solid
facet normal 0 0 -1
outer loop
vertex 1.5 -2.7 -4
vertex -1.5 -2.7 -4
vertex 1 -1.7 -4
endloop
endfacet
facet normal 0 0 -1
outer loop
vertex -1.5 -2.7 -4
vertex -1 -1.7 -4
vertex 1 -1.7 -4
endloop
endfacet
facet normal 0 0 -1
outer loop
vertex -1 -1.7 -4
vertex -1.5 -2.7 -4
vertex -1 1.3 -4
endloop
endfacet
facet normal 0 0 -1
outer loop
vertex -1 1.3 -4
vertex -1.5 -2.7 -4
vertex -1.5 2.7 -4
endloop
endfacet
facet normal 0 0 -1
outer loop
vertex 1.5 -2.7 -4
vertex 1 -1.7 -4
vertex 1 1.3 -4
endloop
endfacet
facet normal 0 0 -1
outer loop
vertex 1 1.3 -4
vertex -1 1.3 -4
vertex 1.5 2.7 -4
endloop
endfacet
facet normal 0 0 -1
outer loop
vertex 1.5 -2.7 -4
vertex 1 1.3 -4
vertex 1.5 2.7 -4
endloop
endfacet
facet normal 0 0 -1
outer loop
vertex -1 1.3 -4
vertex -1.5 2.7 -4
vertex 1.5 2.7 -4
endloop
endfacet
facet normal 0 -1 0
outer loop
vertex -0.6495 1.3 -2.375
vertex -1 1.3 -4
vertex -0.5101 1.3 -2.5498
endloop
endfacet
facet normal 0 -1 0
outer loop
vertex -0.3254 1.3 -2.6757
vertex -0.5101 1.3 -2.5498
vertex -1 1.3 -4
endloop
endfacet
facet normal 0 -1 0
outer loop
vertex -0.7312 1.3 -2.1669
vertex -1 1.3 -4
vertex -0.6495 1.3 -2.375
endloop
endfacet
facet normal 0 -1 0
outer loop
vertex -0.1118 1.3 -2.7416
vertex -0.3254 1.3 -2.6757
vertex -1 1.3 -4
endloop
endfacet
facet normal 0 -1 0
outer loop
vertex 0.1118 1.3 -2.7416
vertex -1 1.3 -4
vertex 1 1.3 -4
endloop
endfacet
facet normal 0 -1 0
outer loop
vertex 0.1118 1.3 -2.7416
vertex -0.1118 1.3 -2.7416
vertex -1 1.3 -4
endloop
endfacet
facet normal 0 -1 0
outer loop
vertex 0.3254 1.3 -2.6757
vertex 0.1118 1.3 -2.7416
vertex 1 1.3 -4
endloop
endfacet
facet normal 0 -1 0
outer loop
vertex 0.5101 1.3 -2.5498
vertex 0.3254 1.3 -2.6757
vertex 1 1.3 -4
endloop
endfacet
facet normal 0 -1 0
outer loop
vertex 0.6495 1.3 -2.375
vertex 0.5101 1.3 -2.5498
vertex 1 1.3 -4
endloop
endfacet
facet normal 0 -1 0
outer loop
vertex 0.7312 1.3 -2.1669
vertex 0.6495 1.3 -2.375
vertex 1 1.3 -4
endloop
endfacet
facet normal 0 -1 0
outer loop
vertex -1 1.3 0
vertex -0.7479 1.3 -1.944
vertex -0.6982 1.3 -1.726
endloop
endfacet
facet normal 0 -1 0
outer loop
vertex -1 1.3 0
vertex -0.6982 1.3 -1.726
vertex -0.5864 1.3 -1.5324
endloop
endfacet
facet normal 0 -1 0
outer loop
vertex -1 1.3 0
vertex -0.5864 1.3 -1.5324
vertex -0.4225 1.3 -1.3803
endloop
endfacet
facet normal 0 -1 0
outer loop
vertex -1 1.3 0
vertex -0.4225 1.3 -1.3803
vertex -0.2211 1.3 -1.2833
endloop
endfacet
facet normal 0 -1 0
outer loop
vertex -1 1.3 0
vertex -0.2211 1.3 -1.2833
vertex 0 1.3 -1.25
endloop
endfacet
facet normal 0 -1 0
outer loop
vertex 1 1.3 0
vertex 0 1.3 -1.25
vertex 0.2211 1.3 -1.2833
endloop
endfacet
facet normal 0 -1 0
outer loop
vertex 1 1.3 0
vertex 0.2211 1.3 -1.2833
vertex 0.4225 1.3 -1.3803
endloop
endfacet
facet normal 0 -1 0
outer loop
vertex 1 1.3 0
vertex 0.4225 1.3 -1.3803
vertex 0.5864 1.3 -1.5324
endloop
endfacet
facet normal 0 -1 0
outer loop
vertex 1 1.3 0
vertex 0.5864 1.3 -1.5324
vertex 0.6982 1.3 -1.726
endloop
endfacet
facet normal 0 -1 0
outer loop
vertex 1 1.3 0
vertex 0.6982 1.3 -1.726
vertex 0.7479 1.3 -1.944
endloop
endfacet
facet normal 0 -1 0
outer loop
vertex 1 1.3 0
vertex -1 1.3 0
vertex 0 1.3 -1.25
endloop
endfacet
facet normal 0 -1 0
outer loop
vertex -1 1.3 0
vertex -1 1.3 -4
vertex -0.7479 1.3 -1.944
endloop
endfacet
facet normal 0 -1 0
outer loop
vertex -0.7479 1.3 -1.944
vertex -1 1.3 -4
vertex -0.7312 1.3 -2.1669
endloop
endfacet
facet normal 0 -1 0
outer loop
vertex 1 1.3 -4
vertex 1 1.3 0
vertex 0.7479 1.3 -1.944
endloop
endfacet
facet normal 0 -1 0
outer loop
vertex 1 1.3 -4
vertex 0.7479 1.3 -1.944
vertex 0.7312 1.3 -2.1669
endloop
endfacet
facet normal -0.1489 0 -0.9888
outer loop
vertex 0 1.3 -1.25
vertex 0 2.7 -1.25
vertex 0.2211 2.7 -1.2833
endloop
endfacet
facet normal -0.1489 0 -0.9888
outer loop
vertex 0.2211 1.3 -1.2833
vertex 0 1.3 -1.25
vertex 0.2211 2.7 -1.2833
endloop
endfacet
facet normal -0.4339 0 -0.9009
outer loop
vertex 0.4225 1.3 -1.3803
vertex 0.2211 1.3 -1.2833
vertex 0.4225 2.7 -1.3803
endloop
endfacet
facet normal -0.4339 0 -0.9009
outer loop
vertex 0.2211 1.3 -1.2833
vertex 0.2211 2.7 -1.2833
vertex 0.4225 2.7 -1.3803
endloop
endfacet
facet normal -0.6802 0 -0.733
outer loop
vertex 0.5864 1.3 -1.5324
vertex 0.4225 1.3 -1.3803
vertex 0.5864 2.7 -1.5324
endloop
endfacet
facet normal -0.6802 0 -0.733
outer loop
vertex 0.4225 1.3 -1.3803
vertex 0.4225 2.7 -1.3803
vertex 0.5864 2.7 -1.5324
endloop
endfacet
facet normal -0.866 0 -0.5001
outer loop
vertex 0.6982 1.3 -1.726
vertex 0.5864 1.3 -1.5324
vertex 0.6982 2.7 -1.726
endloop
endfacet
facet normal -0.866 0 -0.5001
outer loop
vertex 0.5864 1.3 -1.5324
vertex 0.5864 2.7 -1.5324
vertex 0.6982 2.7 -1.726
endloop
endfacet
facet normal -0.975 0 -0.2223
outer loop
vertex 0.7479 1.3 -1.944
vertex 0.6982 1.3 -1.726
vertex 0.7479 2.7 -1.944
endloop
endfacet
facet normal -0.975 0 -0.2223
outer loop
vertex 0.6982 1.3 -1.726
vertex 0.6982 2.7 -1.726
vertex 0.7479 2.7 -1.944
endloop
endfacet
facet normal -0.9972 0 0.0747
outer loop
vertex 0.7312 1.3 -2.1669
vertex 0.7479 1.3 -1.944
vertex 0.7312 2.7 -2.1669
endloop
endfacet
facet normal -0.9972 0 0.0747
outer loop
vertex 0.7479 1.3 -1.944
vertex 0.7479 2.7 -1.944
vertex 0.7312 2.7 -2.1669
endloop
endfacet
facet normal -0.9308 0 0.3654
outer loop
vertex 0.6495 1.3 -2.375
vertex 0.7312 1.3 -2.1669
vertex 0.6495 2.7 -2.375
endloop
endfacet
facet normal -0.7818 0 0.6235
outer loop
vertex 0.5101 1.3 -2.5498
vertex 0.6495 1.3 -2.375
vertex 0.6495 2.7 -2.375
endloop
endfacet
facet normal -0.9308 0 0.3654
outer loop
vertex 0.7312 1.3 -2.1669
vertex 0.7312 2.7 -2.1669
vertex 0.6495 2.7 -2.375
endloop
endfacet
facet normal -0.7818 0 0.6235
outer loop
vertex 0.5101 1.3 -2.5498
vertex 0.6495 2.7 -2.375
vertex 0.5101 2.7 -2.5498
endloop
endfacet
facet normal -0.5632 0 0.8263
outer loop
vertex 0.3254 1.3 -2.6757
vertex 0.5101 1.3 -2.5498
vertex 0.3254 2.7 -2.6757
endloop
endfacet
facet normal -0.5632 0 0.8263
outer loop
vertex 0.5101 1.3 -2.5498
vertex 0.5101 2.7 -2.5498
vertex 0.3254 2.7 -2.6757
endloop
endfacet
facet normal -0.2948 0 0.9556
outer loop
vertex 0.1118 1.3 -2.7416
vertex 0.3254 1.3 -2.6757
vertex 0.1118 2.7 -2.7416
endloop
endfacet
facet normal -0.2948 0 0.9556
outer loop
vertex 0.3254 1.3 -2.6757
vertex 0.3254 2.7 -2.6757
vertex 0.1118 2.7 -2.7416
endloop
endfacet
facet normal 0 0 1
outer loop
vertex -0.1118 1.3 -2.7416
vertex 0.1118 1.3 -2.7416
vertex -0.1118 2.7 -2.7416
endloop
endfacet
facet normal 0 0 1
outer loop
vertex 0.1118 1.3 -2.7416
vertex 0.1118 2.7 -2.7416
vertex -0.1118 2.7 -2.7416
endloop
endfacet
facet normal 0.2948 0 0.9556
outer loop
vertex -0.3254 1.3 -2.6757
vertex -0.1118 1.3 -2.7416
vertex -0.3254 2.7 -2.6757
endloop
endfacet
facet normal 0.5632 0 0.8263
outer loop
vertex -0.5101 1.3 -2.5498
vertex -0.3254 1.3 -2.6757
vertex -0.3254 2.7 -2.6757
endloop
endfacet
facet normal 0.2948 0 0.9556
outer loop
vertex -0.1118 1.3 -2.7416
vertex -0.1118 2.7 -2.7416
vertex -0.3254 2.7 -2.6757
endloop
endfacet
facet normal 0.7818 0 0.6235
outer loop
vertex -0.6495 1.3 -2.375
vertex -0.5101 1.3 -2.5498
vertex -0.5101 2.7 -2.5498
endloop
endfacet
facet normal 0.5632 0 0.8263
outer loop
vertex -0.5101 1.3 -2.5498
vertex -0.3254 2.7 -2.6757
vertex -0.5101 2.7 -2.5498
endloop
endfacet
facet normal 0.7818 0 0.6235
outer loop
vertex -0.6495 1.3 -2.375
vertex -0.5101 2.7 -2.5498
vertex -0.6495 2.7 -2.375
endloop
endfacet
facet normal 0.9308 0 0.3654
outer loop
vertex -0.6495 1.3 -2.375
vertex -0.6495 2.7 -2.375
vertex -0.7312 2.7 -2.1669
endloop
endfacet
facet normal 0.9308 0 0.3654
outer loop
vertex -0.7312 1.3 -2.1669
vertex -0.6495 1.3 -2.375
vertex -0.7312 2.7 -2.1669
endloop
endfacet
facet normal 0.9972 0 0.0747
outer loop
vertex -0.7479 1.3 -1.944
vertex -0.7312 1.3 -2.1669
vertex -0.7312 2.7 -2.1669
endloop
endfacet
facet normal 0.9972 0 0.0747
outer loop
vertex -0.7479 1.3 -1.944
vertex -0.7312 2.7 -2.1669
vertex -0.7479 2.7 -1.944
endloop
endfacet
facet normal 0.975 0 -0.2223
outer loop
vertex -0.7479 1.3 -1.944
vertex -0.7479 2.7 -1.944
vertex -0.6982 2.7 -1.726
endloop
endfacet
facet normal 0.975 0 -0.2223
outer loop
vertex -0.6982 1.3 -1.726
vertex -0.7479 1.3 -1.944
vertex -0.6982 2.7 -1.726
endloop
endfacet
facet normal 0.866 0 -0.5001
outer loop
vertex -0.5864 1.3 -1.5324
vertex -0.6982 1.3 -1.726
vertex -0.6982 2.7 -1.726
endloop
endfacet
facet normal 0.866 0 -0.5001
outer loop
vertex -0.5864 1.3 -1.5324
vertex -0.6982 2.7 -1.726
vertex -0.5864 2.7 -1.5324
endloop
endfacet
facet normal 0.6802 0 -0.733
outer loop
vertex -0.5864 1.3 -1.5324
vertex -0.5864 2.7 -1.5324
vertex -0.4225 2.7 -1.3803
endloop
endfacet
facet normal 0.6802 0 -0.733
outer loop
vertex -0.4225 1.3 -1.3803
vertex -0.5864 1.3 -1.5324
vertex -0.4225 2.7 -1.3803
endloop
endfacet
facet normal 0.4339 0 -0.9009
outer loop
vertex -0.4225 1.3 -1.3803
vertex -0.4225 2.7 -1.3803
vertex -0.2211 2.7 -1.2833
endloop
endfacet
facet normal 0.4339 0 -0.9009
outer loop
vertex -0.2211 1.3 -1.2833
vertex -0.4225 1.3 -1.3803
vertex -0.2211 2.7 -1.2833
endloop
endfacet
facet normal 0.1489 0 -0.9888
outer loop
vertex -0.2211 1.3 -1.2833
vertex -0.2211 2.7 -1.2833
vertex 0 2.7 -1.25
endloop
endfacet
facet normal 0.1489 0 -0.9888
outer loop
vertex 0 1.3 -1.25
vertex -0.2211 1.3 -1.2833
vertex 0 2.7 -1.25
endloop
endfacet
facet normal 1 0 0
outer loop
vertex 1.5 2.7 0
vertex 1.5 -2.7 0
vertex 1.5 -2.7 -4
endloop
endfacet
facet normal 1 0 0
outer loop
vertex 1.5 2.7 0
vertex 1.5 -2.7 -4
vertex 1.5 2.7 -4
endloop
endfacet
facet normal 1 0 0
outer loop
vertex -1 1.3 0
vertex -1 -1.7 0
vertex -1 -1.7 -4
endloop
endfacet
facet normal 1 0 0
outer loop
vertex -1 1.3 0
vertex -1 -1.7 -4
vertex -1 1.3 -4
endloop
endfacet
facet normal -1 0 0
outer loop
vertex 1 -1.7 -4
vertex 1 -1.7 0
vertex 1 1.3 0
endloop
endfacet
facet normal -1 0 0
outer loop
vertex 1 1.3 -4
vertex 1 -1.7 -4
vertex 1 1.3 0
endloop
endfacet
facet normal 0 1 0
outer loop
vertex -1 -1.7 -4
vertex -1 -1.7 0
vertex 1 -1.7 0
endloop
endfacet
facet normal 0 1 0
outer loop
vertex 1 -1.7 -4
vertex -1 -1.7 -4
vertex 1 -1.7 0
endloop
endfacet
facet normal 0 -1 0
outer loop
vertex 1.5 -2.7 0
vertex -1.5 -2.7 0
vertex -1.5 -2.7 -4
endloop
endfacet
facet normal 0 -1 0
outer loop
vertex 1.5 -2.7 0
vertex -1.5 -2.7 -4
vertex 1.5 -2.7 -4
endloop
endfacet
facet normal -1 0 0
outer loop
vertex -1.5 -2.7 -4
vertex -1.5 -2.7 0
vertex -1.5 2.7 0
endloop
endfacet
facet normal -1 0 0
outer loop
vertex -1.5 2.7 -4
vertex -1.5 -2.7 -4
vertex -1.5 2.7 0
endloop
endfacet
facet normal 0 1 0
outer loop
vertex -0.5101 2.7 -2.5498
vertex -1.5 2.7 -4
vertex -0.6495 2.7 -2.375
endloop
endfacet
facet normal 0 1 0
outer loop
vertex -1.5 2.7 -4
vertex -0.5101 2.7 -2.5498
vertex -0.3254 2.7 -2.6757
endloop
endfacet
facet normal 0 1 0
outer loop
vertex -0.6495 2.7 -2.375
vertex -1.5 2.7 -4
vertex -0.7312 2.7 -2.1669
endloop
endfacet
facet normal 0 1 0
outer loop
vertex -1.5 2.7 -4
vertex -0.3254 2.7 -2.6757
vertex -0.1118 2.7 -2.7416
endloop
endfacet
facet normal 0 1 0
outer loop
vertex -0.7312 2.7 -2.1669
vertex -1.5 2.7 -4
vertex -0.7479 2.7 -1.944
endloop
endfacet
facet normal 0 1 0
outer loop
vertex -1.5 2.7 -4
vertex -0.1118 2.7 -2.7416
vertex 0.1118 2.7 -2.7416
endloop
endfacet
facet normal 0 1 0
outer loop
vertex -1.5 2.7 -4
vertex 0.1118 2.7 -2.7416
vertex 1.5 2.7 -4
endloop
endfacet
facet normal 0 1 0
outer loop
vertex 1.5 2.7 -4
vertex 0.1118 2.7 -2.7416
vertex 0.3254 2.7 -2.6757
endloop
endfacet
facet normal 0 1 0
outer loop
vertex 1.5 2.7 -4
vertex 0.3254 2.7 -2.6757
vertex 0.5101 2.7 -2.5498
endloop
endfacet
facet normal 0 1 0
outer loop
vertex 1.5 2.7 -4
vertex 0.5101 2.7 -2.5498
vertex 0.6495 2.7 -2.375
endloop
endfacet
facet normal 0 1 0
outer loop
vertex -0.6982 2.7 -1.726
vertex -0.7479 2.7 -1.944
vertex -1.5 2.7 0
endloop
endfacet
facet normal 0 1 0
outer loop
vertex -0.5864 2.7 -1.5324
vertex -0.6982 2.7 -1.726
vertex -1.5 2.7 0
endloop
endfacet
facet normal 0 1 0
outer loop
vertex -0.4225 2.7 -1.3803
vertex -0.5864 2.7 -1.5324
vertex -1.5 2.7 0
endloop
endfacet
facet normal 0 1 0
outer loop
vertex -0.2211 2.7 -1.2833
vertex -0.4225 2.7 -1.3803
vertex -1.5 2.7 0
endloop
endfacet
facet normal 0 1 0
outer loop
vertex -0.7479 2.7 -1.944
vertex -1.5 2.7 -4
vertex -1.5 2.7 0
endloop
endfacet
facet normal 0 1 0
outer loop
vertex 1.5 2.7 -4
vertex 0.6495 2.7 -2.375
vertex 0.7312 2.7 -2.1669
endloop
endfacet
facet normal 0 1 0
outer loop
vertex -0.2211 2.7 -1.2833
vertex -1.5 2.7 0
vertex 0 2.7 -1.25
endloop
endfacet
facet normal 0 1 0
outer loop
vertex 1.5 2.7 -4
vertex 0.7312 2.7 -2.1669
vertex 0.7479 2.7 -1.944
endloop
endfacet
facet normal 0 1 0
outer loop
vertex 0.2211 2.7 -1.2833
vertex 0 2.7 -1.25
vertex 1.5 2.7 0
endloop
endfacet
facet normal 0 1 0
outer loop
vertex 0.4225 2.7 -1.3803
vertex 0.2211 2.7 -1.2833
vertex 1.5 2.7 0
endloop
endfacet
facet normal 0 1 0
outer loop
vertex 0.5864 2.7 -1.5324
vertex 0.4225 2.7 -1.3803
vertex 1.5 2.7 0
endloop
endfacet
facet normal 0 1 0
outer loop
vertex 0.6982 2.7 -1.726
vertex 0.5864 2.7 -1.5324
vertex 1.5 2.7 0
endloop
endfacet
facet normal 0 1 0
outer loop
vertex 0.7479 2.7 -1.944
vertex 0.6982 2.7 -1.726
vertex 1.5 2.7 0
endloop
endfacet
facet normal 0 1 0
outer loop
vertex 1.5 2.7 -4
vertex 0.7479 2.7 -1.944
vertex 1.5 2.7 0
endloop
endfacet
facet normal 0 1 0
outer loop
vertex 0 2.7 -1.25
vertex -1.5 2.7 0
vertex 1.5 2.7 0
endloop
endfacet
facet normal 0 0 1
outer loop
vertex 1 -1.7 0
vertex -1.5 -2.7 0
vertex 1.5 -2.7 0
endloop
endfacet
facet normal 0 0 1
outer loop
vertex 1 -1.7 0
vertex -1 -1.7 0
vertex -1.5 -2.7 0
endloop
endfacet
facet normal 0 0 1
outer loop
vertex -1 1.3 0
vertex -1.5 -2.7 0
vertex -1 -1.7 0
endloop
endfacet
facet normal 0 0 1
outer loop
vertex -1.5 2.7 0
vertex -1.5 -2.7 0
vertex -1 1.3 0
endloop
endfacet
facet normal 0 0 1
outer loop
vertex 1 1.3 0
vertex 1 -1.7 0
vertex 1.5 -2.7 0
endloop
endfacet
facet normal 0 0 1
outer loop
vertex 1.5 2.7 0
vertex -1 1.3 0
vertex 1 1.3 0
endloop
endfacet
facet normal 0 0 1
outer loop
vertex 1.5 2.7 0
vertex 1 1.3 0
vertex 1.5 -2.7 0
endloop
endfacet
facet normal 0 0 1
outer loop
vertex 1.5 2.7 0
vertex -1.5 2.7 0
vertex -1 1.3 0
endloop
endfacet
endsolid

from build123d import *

# Parameters (mm, degrees)
SKETCH_1_W          = 3
SKETCH_1_H          = 5.4
EXTRUDE_1_DEPTH     = 4
SKETCH_2_W          = 2
SKETCH_2_H          = 3
CUT_EXTRUDE_1_DEPTH = 6.053711507
CUT_EXTRUDE_2_REACH = 8.885
SKETCH_3_R          = 0.75


with BuildPart() as part:
    # Эскиз1 → Бобышка-Вытянуть1 (new body)
    with BuildSketch(Plane.XY):
        Rectangle(SKETCH_1_W, SKETCH_1_H)
    extrude(amount=-EXTRUDE_1_DEPTH)

    # Эскиз2 → Вырез-Вытянуть1 (cut, through all)
    with BuildSketch(Plane.XY):
        with Locations((0, -0.2)):
            Rectangle(SKETCH_2_W, SKETCH_2_H)
    extrude(amount=-CUT_EXTRUDE_1_DEPTH, mode=Mode.SUBTRACT)

    # Эскиз3 → Вырез-Вытянуть2 (cut, up to next)
    with BuildSketch(Plane(origin=(0, 2.7, 0), x_dir=(1, 0, 0), z_dir=(0, 1, 0)), mode=Mode.PRIVATE) as cut_extrude_2_sk1:
        with Locations(Location((0, 2, 0), (0, 0, 270))):
            Circle(SKETCH_3_R)
    cut_extrude_2_tool1 = extrude(cut_extrude_2_sk1.sketch, amount=-CUT_EXTRUDE_2_REACH, mode=Mode.PRIVATE) & part.part
    add(cut_extrude_2_tool1.solids().sort_by_distance((0, 2.7, -2))[0], mode=Mode.SUBTRACT)


solid = part.part
